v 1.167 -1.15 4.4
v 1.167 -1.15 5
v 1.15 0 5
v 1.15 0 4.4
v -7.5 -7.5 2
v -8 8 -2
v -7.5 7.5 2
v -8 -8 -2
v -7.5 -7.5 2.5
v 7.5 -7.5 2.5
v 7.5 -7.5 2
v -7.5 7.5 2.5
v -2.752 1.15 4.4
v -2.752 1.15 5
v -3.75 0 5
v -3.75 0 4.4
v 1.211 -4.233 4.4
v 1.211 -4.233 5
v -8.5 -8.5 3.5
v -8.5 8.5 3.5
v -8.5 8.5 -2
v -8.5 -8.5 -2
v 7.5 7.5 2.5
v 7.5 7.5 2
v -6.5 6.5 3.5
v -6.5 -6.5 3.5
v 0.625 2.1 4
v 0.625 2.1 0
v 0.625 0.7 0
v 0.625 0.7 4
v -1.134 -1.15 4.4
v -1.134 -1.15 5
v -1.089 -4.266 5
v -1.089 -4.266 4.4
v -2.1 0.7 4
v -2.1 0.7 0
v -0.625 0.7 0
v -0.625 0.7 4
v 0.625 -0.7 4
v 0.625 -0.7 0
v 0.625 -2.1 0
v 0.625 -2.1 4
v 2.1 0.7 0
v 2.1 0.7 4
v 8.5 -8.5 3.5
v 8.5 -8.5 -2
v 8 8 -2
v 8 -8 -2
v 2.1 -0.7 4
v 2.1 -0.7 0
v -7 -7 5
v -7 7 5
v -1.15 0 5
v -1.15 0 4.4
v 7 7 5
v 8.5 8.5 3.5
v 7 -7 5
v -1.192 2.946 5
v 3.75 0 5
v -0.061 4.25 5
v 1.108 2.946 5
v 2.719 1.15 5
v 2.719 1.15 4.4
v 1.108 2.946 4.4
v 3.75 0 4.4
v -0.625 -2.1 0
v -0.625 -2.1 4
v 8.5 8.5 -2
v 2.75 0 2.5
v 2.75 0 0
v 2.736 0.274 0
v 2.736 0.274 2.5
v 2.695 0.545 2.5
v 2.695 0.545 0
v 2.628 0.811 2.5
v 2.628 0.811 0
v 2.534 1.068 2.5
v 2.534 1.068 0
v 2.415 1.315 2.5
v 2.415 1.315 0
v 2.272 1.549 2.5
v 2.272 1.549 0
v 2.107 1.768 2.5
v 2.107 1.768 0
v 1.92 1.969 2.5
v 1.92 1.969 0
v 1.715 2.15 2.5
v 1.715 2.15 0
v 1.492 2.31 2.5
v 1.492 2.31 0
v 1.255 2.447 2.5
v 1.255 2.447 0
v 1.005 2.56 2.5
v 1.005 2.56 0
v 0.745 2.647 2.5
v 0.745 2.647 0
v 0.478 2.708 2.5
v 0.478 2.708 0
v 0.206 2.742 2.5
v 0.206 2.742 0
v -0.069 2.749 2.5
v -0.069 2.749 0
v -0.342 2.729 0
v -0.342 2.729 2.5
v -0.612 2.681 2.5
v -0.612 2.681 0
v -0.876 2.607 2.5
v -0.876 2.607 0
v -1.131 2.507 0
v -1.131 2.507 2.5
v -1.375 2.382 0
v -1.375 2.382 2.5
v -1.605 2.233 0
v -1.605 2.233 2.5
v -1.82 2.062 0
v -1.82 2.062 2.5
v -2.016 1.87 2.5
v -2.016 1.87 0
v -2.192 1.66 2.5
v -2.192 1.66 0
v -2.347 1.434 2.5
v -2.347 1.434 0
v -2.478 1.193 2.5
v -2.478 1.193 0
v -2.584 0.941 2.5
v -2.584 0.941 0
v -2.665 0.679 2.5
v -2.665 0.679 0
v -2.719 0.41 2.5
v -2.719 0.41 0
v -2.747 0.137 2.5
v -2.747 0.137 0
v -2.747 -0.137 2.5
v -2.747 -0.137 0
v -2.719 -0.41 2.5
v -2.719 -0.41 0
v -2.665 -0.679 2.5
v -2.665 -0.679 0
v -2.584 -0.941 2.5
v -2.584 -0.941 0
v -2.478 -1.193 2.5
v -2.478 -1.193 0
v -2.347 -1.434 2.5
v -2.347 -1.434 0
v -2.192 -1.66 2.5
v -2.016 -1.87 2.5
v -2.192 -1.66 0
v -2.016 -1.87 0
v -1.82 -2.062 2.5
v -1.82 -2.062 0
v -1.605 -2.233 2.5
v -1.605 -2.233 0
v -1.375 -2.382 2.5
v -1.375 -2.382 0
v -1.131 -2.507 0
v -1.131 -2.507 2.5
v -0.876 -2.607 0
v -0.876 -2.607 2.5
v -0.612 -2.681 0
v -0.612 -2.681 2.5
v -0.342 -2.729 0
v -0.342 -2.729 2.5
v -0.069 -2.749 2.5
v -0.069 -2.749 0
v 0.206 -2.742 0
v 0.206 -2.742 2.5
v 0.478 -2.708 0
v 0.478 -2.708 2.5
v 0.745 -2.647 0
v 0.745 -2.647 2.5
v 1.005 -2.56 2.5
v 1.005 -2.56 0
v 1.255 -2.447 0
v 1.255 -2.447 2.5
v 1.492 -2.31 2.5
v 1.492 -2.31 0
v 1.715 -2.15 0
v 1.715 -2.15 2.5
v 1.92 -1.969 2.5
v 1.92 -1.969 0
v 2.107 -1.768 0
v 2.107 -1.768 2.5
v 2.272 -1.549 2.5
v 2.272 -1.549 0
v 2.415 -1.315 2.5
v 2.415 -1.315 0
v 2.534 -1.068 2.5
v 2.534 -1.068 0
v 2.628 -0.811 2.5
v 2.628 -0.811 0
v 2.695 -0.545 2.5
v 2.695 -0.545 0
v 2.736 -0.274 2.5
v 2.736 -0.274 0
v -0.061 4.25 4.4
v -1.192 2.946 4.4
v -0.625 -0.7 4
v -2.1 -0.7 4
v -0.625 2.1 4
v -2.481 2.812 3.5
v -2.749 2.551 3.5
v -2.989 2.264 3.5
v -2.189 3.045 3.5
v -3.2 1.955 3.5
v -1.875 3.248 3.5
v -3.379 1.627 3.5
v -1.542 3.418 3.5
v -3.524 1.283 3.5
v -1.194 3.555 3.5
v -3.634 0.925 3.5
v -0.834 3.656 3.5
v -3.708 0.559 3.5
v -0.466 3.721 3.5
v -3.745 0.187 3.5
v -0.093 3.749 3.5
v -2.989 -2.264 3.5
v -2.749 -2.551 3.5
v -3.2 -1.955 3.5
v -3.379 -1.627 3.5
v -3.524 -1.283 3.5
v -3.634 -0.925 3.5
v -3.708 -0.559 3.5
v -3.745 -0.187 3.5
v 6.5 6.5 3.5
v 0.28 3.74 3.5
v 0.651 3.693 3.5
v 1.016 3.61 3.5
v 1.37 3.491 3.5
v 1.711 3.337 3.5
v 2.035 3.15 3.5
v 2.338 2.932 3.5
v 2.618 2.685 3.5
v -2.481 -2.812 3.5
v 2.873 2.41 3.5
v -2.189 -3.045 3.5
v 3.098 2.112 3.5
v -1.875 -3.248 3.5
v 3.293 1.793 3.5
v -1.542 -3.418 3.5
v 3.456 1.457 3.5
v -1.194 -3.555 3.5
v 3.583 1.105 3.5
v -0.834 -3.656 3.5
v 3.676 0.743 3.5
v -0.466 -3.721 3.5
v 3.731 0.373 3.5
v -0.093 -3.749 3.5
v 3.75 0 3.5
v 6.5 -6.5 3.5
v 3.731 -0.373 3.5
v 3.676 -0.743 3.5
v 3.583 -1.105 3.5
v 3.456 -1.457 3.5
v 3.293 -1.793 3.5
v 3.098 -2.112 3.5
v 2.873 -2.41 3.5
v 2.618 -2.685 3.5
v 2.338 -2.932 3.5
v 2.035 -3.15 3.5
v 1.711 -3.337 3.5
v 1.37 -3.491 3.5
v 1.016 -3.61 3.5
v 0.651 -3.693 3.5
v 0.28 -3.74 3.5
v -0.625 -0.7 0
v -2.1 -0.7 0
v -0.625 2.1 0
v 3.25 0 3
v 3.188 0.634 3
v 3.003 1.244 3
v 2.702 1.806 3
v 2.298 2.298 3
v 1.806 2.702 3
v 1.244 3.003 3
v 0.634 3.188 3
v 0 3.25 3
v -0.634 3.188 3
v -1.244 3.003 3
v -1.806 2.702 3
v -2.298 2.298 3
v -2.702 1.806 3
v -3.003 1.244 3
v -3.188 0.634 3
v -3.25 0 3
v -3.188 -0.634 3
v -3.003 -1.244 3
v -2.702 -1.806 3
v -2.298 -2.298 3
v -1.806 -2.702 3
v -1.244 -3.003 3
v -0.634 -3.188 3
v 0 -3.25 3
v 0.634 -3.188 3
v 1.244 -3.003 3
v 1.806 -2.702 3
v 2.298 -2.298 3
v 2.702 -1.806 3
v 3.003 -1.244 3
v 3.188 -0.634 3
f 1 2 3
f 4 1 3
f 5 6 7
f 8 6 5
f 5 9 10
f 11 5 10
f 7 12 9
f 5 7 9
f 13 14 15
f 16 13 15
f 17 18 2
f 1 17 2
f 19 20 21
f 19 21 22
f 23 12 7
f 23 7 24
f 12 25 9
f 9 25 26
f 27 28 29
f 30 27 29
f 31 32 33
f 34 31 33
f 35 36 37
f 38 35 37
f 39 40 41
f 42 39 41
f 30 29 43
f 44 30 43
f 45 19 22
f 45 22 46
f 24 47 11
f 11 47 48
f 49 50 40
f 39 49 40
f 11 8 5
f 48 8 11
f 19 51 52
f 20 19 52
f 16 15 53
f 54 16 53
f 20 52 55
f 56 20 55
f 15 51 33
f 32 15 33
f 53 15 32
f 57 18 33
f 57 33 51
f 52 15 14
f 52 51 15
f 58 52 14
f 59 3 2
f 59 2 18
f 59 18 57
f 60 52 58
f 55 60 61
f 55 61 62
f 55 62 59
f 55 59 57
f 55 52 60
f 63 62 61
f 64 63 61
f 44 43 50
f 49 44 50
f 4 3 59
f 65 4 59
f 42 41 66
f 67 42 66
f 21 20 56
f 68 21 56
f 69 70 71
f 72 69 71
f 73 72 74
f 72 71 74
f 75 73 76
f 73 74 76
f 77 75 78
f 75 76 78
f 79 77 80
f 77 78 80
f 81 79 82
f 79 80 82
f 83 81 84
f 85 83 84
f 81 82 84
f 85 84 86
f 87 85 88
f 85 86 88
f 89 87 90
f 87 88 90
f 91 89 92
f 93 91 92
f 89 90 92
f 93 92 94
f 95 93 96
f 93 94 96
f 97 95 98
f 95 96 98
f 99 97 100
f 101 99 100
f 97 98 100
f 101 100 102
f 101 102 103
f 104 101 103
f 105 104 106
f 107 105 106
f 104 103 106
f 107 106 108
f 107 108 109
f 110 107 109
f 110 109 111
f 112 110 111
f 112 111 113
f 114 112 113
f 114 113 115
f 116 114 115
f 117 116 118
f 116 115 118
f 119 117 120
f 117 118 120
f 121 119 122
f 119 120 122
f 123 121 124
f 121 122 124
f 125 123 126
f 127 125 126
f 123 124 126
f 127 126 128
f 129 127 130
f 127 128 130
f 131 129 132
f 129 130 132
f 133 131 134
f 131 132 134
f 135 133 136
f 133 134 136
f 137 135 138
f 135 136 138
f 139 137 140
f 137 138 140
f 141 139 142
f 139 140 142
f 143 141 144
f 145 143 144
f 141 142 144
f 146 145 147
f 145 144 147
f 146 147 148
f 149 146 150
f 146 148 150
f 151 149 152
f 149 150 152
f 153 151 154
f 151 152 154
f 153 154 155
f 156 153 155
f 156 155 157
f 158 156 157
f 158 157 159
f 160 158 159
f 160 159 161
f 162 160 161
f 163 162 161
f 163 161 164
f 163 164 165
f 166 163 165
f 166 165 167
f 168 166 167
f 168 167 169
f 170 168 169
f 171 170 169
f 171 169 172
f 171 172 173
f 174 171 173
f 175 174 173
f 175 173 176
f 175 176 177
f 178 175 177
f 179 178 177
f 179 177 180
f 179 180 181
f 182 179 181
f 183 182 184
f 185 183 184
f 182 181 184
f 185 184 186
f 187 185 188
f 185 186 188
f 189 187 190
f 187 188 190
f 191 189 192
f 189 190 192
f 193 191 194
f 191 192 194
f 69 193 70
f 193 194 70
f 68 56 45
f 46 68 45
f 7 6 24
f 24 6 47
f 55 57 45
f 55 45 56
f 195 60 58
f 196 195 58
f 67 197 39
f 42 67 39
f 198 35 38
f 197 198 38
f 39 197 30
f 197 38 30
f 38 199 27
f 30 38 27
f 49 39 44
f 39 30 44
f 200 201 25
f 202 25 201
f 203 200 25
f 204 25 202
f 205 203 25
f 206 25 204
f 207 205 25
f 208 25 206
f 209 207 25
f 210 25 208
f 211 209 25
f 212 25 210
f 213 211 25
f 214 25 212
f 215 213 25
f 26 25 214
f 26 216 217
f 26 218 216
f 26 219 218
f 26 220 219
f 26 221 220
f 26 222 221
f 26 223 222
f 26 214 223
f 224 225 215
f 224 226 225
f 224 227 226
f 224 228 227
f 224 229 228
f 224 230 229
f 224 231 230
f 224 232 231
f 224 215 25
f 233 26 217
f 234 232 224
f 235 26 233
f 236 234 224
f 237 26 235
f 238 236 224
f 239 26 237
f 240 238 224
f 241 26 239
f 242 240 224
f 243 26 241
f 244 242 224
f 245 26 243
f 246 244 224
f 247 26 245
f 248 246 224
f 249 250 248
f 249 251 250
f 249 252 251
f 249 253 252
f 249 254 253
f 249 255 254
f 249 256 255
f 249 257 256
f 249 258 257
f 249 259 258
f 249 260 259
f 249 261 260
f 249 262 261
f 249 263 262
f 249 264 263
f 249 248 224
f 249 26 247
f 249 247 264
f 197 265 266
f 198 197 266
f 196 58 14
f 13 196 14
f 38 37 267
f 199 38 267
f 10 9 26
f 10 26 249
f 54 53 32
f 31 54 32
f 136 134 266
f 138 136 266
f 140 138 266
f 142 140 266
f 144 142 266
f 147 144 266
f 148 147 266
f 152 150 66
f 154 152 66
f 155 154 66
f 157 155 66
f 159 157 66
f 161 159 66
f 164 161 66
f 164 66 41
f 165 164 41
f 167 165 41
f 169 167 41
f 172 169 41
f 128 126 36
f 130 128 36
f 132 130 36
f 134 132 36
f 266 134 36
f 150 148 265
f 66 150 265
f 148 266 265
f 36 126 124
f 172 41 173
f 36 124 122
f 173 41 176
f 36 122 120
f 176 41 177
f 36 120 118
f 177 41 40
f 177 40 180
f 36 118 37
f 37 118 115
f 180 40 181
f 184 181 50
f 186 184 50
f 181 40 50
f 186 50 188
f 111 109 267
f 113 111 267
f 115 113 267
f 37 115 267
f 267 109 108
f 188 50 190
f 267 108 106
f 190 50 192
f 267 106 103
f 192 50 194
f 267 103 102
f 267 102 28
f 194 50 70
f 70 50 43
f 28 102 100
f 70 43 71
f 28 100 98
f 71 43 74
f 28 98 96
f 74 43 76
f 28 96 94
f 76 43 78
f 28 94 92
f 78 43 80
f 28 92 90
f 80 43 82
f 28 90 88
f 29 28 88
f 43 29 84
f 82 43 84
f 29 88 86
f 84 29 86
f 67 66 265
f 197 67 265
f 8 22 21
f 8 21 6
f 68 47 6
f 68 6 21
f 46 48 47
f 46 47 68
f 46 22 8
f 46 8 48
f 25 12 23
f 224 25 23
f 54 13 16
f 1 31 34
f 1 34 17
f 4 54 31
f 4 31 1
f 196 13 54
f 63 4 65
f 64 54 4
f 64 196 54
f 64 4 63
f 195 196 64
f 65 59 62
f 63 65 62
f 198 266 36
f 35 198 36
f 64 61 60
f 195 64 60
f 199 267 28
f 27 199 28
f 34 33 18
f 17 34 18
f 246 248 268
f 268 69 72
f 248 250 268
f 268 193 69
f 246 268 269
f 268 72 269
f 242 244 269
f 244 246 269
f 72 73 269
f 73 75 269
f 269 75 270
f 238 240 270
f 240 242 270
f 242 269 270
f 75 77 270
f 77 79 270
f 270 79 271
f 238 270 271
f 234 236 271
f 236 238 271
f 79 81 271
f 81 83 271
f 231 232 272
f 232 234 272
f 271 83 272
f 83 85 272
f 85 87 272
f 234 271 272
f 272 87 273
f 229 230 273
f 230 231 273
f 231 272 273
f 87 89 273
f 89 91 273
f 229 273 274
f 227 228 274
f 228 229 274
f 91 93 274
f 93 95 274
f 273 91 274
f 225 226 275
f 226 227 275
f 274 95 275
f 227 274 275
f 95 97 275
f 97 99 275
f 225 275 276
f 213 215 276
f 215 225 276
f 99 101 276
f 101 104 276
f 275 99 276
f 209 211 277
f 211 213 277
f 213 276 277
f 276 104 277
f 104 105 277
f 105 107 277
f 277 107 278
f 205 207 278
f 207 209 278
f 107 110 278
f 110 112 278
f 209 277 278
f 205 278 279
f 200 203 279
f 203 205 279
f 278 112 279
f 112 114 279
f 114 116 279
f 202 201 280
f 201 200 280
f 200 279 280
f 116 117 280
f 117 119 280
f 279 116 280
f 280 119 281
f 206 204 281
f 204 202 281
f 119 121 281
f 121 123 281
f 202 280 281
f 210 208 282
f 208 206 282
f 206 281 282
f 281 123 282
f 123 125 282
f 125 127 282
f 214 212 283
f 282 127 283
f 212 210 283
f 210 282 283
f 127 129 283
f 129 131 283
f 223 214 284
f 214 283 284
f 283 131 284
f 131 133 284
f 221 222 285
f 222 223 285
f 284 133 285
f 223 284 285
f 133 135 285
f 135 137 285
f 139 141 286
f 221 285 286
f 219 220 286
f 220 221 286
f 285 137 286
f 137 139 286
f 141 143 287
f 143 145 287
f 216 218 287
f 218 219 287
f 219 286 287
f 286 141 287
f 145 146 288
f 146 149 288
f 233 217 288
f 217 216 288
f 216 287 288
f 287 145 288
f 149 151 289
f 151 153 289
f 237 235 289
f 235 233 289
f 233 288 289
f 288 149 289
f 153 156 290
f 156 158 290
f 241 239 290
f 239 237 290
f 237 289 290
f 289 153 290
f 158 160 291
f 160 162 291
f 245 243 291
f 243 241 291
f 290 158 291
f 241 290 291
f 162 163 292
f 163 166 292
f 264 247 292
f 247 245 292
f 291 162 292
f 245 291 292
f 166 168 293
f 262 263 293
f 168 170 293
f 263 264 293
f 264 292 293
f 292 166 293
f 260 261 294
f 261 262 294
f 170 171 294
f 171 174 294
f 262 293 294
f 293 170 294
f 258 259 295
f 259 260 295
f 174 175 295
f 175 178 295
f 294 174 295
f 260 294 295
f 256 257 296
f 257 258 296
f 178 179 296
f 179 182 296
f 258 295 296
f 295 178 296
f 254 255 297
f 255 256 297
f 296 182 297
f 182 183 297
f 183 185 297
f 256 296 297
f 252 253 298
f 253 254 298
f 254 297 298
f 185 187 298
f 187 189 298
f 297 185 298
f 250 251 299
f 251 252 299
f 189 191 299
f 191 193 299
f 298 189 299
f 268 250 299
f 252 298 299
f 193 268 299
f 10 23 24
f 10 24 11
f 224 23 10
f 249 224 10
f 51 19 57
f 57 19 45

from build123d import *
from OCP.BRepFilletAPI import BRepFilletAPI_MakeChamfer

# Parameters (mm, degrees)
SKETCH1_R           = 2.75
BOSS_EXTRUDE1_DEPTH = 4
SKETCH2_W           = 17
SKETCH2_H           = 17
BOSS_EXTRUDE2_DEPTH = 1
SKETCH3_W           = 17
SKETCH3_H           = 17
SKETCH3_W_2         = 15
SKETCH3_H_2         = 15
BOSS_EXTRUDE3_DEPTH = 6
CHAMFER1_SIZE       = 1.5
CHAMFER2_SIZE       = 4
CHAMFER2_SIZE2      = 0.5
CUT_EXTRUDE1_DEPTH  = 0.6
BOSS_EXTRUDE4_START = 0.5
SKETCH5_W           = 14.989533589
SKETCH5_H           = 15
SKETCH5_R           = 2.75
BOSS_EXTRUDE4_DEPTH = 0.5


with BuildPart() as part:
    # Sketch1 → Boss-Extrude1 (new body)
    with BuildSketch(Plane(origin=(0, 0, 0), x_dir=(0, 1, 0), z_dir=(0, 0, 1))):
        with Locations(Location((0, 0, 0), (0, 0, 270))):
            Circle(SKETCH1_R)
        Polygon((-0.7, -0.625), (-2.1, -0.625), (-2.1, 0.625), (-0.7, 0.625), (-0.7, 2.1), (0.7, 2.1), (0.7, 0.625), (2.1, 0.625), (2.1, -0.625), (0.7, -0.625), (0.7, -2.1), (-0.7, -2.1), align=None, mode=Mode.SUBTRACT)
    extrude(amount=BOSS_EXTRUDE1_DEPTH)

    # Sketch2 → Boss-Extrude2 (add)
    with BuildSketch(Plane.XY.offset(4)):
        Rectangle(SKETCH2_W, SKETCH2_H)
    extrude(amount=BOSS_EXTRUDE2_DEPTH)

    # Sketch3 → Boss-Extrude3 (add)
    with BuildSketch(Plane(origin=(0, 0, 4), x_dir=(1, 0, 0), z_dir=(0, 0, -1))):
        Rectangle(SKETCH3_W, SKETCH3_H)
        Rectangle(SKETCH3_W_2, SKETCH3_H_2, mode=Mode.SUBTRACT)
    extrude(amount=BOSS_EXTRUDE3_DEPTH)

    # Chamfer1
    chamfer1_edges = [part.edges().sort_by_distance(p)[0] for p in [
        (8.5, 0, 5),
        (0, 8.5, 5),
        (-8.5, 0, 5),
        (0, -8.5, 5),
        (-2.75, 0, 4),
        (0, -7.5, 4),
        (7.5, 0, 4),
        (-7.5, 0, 4),
        (0, 7.5, 4),
    ]]
    chamfer(chamfer1_edges, length=CHAMFER1_SIZE)

    # Chamfer2: one chamfer whose edges measure the first distance from different faces: ONE call of the kernel's chamfer builder (chamfer() names one face for all edges)
    chamfer2_edges_1 = [part.edges().sort_by_distance(p)[0] for p in [
        (-7.5, 0, -2),
    ]]
    chamfer2_side_1 = [part.faces().sort_by_distance(p)[0] for p in [
        (-7.5, 0, 0.25),
    ]]
    chamfer2_edges_2 = [part.edges().sort_by_distance(p)[0] for p in [
        (0, 7.5, -2),
    ]]
    chamfer2_side_2 = [part.faces().sort_by_distance(p)[0] for p in [
        (0, 7.5, 0.25),
    ]]
    chamfer2_edges_3 = [part.edges().sort_by_distance(p)[0] for p in [
        (0, -7.5, -2),
    ]]
    chamfer2_side_3 = [part.faces().sort_by_distance(p)[0] for p in [
        (0, -7.5, 0.25),
    ]]
    chamfer2_edges_4 = [part.edges().sort_by_distance(p)[0] for p in [
        (7.5, 0, -2),
    ]]
    chamfer2_side_4 = [part.faces().sort_by_distance(p)[0] for p in [
        (7.5, 0, 0.25),
    ]]
    chamfer2 = BRepFilletAPI_MakeChamfer(part.part.solid().wrapped)
    for e in chamfer2_edges_1:
        chamfer2.Add(CHAMFER2_SIZE, CHAMFER2_SIZE2, e.wrapped, chamfer2_side_1[0].wrapped)  # the first distance lies on this face
    for e in chamfer2_edges_2:
        chamfer2.Add(CHAMFER2_SIZE, CHAMFER2_SIZE2, e.wrapped, chamfer2_side_2[0].wrapped)  # the first distance lies on this face
    for e in chamfer2_edges_3:
        chamfer2.Add(CHAMFER2_SIZE, CHAMFER2_SIZE2, e.wrapped, chamfer2_side_3[0].wrapped)  # the first distance lies on this face
    for e in chamfer2_edges_4:
        chamfer2.Add(CHAMFER2_SIZE, CHAMFER2_SIZE2, e.wrapped, chamfer2_side_4[0].wrapped)  # the first distance lies on this face
    add(Compound.cast(chamfer2.Shape()), mode=Mode.REPLACE)

    # Sketch4 → Cut-Extrude1 (cut)
    with BuildSketch(Plane.XY.offset(5)):
        Polygon((-0.06051573, 4.249569137), (-1.192187018, 2.946103658), (-1.166609713, 1.15), (1.133856704, 1.15), (1.108279399, 2.946103658), align=None)
        Polygon((-1.166609713, 1.15), (-1.192187018, 2.946103658), (-2.751567741, 1.15), align=None)
        Polygon((-1.150233209, 0), (-1.166609713, 1.15), (-2.751567741, 1.15), (-3.75, 0), align=None)
        Polygon((1.133856704, 1.15), (-1.166609713, 1.15), (-1.150233209, 0), (1.150233209, 0), align=None)
        Polygon((2.718814732, 1.15), (1.108279399, 2.946103658), (1.133856704, 1.15), align=None)
        Polygon((2.718814732, 1.15), (1.133856704, 1.15), (1.150233209, 0), (3.75, 0), align=None)
        Polygon((1.166609713, -1.15), (-1.133856704, -1.15), (-1.08948427, -4.265945641), (1.21051573, -4.233192632), align=None)
        Polygon((1.150233209, 0), (-1.150233209, 0), (-1.133856704, -1.15), (1.166609713, -1.15), align=None)
    extrude(amount=-CUT_EXTRUDE1_DEPTH, mode=Mode.SUBTRACT)

    # Sketch5 → Boss-Extrude4 (add)
    with BuildSketch(Plane(origin=(0, 0, 4), x_dir=(1, 0, 0), z_dir=(0, 0, -1)).offset(BOSS_EXTRUDE4_START)):
        with Locations((-0.005233206, 0)):
            Rectangle(SKETCH5_W, SKETCH5_H)
        with Locations(Location((0, 0, 0), (0, 0, 180))):
            Circle(SKETCH5_R, mode=Mode.SUBTRACT)
    extrude(amount=-BOSS_EXTRUDE4_DEPTH)


solid = part.part
